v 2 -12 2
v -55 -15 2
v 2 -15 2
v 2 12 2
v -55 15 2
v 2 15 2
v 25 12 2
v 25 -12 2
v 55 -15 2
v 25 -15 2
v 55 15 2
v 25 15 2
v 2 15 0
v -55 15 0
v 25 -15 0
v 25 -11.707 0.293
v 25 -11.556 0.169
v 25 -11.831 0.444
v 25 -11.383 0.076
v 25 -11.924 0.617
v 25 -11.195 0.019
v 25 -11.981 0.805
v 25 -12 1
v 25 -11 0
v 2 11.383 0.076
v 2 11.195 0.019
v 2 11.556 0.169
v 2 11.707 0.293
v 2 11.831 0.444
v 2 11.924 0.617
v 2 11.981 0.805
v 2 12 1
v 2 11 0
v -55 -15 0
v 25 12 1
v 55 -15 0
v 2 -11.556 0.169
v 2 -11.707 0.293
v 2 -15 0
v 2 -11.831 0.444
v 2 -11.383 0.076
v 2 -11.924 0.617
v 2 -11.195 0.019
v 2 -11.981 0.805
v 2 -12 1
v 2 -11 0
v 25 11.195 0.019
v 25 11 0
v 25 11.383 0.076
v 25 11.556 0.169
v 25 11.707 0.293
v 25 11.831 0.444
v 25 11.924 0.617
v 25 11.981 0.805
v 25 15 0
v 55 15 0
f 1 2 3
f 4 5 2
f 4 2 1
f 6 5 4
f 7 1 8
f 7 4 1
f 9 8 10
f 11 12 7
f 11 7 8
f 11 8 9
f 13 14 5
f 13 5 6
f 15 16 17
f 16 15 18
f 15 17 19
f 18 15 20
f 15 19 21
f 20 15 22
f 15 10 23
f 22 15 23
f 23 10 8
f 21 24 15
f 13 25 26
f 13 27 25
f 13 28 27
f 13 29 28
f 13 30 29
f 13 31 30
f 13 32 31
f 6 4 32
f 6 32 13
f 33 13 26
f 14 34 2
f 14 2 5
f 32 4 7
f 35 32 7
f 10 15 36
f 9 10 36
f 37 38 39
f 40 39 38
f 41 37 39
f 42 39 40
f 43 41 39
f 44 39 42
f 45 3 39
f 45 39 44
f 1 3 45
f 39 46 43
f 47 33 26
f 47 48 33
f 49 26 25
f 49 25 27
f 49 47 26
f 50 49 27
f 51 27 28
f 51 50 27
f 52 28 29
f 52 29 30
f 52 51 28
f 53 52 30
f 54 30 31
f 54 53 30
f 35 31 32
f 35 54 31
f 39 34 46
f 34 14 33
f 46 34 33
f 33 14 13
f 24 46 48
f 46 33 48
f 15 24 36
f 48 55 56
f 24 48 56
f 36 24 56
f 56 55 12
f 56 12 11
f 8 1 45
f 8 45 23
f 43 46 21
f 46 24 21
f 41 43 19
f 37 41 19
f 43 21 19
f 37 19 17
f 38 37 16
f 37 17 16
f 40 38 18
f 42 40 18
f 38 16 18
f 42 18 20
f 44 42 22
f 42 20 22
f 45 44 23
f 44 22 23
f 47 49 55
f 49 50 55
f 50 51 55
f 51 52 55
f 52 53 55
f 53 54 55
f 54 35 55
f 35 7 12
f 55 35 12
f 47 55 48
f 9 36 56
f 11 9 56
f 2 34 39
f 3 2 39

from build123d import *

# Parameters (mm, degrees)
F0_W     = 110
F0_H     = 30
F1_DEPTH = 2
F2_W     = 23
F2_H     = 3
F3_DEPTH = 25
F4_R     = 1


with BuildPart() as f1:
    # F0 (on Top) → F1 (new body)
    with BuildSketch(Plane.XY):
        Rectangle(F0_W, F0_H)
    extrude(amount=F1_DEPTH)

    # F2 (on face) → F3 (cut)
    with BuildSketch(Plane.XY.offset(2)):
        with Locations((13.5, 13.5)):
            Rectangle(F2_W, F2_H)
        with Locations((13.5, -13.5)):
            Rectangle(F2_W, F2_H)
    extrude(amount=-F3_DEPTH, mode=Mode.SUBTRACT)

    # F4
    f4_edges = [f1.edges().sort_by_distance(p)[0] for p in [
        (13.5, -12, 0),
        (13.5, 12, 0),
    ]]
    fillet(f4_edges, radius=F4_R)


solid = f1.part
